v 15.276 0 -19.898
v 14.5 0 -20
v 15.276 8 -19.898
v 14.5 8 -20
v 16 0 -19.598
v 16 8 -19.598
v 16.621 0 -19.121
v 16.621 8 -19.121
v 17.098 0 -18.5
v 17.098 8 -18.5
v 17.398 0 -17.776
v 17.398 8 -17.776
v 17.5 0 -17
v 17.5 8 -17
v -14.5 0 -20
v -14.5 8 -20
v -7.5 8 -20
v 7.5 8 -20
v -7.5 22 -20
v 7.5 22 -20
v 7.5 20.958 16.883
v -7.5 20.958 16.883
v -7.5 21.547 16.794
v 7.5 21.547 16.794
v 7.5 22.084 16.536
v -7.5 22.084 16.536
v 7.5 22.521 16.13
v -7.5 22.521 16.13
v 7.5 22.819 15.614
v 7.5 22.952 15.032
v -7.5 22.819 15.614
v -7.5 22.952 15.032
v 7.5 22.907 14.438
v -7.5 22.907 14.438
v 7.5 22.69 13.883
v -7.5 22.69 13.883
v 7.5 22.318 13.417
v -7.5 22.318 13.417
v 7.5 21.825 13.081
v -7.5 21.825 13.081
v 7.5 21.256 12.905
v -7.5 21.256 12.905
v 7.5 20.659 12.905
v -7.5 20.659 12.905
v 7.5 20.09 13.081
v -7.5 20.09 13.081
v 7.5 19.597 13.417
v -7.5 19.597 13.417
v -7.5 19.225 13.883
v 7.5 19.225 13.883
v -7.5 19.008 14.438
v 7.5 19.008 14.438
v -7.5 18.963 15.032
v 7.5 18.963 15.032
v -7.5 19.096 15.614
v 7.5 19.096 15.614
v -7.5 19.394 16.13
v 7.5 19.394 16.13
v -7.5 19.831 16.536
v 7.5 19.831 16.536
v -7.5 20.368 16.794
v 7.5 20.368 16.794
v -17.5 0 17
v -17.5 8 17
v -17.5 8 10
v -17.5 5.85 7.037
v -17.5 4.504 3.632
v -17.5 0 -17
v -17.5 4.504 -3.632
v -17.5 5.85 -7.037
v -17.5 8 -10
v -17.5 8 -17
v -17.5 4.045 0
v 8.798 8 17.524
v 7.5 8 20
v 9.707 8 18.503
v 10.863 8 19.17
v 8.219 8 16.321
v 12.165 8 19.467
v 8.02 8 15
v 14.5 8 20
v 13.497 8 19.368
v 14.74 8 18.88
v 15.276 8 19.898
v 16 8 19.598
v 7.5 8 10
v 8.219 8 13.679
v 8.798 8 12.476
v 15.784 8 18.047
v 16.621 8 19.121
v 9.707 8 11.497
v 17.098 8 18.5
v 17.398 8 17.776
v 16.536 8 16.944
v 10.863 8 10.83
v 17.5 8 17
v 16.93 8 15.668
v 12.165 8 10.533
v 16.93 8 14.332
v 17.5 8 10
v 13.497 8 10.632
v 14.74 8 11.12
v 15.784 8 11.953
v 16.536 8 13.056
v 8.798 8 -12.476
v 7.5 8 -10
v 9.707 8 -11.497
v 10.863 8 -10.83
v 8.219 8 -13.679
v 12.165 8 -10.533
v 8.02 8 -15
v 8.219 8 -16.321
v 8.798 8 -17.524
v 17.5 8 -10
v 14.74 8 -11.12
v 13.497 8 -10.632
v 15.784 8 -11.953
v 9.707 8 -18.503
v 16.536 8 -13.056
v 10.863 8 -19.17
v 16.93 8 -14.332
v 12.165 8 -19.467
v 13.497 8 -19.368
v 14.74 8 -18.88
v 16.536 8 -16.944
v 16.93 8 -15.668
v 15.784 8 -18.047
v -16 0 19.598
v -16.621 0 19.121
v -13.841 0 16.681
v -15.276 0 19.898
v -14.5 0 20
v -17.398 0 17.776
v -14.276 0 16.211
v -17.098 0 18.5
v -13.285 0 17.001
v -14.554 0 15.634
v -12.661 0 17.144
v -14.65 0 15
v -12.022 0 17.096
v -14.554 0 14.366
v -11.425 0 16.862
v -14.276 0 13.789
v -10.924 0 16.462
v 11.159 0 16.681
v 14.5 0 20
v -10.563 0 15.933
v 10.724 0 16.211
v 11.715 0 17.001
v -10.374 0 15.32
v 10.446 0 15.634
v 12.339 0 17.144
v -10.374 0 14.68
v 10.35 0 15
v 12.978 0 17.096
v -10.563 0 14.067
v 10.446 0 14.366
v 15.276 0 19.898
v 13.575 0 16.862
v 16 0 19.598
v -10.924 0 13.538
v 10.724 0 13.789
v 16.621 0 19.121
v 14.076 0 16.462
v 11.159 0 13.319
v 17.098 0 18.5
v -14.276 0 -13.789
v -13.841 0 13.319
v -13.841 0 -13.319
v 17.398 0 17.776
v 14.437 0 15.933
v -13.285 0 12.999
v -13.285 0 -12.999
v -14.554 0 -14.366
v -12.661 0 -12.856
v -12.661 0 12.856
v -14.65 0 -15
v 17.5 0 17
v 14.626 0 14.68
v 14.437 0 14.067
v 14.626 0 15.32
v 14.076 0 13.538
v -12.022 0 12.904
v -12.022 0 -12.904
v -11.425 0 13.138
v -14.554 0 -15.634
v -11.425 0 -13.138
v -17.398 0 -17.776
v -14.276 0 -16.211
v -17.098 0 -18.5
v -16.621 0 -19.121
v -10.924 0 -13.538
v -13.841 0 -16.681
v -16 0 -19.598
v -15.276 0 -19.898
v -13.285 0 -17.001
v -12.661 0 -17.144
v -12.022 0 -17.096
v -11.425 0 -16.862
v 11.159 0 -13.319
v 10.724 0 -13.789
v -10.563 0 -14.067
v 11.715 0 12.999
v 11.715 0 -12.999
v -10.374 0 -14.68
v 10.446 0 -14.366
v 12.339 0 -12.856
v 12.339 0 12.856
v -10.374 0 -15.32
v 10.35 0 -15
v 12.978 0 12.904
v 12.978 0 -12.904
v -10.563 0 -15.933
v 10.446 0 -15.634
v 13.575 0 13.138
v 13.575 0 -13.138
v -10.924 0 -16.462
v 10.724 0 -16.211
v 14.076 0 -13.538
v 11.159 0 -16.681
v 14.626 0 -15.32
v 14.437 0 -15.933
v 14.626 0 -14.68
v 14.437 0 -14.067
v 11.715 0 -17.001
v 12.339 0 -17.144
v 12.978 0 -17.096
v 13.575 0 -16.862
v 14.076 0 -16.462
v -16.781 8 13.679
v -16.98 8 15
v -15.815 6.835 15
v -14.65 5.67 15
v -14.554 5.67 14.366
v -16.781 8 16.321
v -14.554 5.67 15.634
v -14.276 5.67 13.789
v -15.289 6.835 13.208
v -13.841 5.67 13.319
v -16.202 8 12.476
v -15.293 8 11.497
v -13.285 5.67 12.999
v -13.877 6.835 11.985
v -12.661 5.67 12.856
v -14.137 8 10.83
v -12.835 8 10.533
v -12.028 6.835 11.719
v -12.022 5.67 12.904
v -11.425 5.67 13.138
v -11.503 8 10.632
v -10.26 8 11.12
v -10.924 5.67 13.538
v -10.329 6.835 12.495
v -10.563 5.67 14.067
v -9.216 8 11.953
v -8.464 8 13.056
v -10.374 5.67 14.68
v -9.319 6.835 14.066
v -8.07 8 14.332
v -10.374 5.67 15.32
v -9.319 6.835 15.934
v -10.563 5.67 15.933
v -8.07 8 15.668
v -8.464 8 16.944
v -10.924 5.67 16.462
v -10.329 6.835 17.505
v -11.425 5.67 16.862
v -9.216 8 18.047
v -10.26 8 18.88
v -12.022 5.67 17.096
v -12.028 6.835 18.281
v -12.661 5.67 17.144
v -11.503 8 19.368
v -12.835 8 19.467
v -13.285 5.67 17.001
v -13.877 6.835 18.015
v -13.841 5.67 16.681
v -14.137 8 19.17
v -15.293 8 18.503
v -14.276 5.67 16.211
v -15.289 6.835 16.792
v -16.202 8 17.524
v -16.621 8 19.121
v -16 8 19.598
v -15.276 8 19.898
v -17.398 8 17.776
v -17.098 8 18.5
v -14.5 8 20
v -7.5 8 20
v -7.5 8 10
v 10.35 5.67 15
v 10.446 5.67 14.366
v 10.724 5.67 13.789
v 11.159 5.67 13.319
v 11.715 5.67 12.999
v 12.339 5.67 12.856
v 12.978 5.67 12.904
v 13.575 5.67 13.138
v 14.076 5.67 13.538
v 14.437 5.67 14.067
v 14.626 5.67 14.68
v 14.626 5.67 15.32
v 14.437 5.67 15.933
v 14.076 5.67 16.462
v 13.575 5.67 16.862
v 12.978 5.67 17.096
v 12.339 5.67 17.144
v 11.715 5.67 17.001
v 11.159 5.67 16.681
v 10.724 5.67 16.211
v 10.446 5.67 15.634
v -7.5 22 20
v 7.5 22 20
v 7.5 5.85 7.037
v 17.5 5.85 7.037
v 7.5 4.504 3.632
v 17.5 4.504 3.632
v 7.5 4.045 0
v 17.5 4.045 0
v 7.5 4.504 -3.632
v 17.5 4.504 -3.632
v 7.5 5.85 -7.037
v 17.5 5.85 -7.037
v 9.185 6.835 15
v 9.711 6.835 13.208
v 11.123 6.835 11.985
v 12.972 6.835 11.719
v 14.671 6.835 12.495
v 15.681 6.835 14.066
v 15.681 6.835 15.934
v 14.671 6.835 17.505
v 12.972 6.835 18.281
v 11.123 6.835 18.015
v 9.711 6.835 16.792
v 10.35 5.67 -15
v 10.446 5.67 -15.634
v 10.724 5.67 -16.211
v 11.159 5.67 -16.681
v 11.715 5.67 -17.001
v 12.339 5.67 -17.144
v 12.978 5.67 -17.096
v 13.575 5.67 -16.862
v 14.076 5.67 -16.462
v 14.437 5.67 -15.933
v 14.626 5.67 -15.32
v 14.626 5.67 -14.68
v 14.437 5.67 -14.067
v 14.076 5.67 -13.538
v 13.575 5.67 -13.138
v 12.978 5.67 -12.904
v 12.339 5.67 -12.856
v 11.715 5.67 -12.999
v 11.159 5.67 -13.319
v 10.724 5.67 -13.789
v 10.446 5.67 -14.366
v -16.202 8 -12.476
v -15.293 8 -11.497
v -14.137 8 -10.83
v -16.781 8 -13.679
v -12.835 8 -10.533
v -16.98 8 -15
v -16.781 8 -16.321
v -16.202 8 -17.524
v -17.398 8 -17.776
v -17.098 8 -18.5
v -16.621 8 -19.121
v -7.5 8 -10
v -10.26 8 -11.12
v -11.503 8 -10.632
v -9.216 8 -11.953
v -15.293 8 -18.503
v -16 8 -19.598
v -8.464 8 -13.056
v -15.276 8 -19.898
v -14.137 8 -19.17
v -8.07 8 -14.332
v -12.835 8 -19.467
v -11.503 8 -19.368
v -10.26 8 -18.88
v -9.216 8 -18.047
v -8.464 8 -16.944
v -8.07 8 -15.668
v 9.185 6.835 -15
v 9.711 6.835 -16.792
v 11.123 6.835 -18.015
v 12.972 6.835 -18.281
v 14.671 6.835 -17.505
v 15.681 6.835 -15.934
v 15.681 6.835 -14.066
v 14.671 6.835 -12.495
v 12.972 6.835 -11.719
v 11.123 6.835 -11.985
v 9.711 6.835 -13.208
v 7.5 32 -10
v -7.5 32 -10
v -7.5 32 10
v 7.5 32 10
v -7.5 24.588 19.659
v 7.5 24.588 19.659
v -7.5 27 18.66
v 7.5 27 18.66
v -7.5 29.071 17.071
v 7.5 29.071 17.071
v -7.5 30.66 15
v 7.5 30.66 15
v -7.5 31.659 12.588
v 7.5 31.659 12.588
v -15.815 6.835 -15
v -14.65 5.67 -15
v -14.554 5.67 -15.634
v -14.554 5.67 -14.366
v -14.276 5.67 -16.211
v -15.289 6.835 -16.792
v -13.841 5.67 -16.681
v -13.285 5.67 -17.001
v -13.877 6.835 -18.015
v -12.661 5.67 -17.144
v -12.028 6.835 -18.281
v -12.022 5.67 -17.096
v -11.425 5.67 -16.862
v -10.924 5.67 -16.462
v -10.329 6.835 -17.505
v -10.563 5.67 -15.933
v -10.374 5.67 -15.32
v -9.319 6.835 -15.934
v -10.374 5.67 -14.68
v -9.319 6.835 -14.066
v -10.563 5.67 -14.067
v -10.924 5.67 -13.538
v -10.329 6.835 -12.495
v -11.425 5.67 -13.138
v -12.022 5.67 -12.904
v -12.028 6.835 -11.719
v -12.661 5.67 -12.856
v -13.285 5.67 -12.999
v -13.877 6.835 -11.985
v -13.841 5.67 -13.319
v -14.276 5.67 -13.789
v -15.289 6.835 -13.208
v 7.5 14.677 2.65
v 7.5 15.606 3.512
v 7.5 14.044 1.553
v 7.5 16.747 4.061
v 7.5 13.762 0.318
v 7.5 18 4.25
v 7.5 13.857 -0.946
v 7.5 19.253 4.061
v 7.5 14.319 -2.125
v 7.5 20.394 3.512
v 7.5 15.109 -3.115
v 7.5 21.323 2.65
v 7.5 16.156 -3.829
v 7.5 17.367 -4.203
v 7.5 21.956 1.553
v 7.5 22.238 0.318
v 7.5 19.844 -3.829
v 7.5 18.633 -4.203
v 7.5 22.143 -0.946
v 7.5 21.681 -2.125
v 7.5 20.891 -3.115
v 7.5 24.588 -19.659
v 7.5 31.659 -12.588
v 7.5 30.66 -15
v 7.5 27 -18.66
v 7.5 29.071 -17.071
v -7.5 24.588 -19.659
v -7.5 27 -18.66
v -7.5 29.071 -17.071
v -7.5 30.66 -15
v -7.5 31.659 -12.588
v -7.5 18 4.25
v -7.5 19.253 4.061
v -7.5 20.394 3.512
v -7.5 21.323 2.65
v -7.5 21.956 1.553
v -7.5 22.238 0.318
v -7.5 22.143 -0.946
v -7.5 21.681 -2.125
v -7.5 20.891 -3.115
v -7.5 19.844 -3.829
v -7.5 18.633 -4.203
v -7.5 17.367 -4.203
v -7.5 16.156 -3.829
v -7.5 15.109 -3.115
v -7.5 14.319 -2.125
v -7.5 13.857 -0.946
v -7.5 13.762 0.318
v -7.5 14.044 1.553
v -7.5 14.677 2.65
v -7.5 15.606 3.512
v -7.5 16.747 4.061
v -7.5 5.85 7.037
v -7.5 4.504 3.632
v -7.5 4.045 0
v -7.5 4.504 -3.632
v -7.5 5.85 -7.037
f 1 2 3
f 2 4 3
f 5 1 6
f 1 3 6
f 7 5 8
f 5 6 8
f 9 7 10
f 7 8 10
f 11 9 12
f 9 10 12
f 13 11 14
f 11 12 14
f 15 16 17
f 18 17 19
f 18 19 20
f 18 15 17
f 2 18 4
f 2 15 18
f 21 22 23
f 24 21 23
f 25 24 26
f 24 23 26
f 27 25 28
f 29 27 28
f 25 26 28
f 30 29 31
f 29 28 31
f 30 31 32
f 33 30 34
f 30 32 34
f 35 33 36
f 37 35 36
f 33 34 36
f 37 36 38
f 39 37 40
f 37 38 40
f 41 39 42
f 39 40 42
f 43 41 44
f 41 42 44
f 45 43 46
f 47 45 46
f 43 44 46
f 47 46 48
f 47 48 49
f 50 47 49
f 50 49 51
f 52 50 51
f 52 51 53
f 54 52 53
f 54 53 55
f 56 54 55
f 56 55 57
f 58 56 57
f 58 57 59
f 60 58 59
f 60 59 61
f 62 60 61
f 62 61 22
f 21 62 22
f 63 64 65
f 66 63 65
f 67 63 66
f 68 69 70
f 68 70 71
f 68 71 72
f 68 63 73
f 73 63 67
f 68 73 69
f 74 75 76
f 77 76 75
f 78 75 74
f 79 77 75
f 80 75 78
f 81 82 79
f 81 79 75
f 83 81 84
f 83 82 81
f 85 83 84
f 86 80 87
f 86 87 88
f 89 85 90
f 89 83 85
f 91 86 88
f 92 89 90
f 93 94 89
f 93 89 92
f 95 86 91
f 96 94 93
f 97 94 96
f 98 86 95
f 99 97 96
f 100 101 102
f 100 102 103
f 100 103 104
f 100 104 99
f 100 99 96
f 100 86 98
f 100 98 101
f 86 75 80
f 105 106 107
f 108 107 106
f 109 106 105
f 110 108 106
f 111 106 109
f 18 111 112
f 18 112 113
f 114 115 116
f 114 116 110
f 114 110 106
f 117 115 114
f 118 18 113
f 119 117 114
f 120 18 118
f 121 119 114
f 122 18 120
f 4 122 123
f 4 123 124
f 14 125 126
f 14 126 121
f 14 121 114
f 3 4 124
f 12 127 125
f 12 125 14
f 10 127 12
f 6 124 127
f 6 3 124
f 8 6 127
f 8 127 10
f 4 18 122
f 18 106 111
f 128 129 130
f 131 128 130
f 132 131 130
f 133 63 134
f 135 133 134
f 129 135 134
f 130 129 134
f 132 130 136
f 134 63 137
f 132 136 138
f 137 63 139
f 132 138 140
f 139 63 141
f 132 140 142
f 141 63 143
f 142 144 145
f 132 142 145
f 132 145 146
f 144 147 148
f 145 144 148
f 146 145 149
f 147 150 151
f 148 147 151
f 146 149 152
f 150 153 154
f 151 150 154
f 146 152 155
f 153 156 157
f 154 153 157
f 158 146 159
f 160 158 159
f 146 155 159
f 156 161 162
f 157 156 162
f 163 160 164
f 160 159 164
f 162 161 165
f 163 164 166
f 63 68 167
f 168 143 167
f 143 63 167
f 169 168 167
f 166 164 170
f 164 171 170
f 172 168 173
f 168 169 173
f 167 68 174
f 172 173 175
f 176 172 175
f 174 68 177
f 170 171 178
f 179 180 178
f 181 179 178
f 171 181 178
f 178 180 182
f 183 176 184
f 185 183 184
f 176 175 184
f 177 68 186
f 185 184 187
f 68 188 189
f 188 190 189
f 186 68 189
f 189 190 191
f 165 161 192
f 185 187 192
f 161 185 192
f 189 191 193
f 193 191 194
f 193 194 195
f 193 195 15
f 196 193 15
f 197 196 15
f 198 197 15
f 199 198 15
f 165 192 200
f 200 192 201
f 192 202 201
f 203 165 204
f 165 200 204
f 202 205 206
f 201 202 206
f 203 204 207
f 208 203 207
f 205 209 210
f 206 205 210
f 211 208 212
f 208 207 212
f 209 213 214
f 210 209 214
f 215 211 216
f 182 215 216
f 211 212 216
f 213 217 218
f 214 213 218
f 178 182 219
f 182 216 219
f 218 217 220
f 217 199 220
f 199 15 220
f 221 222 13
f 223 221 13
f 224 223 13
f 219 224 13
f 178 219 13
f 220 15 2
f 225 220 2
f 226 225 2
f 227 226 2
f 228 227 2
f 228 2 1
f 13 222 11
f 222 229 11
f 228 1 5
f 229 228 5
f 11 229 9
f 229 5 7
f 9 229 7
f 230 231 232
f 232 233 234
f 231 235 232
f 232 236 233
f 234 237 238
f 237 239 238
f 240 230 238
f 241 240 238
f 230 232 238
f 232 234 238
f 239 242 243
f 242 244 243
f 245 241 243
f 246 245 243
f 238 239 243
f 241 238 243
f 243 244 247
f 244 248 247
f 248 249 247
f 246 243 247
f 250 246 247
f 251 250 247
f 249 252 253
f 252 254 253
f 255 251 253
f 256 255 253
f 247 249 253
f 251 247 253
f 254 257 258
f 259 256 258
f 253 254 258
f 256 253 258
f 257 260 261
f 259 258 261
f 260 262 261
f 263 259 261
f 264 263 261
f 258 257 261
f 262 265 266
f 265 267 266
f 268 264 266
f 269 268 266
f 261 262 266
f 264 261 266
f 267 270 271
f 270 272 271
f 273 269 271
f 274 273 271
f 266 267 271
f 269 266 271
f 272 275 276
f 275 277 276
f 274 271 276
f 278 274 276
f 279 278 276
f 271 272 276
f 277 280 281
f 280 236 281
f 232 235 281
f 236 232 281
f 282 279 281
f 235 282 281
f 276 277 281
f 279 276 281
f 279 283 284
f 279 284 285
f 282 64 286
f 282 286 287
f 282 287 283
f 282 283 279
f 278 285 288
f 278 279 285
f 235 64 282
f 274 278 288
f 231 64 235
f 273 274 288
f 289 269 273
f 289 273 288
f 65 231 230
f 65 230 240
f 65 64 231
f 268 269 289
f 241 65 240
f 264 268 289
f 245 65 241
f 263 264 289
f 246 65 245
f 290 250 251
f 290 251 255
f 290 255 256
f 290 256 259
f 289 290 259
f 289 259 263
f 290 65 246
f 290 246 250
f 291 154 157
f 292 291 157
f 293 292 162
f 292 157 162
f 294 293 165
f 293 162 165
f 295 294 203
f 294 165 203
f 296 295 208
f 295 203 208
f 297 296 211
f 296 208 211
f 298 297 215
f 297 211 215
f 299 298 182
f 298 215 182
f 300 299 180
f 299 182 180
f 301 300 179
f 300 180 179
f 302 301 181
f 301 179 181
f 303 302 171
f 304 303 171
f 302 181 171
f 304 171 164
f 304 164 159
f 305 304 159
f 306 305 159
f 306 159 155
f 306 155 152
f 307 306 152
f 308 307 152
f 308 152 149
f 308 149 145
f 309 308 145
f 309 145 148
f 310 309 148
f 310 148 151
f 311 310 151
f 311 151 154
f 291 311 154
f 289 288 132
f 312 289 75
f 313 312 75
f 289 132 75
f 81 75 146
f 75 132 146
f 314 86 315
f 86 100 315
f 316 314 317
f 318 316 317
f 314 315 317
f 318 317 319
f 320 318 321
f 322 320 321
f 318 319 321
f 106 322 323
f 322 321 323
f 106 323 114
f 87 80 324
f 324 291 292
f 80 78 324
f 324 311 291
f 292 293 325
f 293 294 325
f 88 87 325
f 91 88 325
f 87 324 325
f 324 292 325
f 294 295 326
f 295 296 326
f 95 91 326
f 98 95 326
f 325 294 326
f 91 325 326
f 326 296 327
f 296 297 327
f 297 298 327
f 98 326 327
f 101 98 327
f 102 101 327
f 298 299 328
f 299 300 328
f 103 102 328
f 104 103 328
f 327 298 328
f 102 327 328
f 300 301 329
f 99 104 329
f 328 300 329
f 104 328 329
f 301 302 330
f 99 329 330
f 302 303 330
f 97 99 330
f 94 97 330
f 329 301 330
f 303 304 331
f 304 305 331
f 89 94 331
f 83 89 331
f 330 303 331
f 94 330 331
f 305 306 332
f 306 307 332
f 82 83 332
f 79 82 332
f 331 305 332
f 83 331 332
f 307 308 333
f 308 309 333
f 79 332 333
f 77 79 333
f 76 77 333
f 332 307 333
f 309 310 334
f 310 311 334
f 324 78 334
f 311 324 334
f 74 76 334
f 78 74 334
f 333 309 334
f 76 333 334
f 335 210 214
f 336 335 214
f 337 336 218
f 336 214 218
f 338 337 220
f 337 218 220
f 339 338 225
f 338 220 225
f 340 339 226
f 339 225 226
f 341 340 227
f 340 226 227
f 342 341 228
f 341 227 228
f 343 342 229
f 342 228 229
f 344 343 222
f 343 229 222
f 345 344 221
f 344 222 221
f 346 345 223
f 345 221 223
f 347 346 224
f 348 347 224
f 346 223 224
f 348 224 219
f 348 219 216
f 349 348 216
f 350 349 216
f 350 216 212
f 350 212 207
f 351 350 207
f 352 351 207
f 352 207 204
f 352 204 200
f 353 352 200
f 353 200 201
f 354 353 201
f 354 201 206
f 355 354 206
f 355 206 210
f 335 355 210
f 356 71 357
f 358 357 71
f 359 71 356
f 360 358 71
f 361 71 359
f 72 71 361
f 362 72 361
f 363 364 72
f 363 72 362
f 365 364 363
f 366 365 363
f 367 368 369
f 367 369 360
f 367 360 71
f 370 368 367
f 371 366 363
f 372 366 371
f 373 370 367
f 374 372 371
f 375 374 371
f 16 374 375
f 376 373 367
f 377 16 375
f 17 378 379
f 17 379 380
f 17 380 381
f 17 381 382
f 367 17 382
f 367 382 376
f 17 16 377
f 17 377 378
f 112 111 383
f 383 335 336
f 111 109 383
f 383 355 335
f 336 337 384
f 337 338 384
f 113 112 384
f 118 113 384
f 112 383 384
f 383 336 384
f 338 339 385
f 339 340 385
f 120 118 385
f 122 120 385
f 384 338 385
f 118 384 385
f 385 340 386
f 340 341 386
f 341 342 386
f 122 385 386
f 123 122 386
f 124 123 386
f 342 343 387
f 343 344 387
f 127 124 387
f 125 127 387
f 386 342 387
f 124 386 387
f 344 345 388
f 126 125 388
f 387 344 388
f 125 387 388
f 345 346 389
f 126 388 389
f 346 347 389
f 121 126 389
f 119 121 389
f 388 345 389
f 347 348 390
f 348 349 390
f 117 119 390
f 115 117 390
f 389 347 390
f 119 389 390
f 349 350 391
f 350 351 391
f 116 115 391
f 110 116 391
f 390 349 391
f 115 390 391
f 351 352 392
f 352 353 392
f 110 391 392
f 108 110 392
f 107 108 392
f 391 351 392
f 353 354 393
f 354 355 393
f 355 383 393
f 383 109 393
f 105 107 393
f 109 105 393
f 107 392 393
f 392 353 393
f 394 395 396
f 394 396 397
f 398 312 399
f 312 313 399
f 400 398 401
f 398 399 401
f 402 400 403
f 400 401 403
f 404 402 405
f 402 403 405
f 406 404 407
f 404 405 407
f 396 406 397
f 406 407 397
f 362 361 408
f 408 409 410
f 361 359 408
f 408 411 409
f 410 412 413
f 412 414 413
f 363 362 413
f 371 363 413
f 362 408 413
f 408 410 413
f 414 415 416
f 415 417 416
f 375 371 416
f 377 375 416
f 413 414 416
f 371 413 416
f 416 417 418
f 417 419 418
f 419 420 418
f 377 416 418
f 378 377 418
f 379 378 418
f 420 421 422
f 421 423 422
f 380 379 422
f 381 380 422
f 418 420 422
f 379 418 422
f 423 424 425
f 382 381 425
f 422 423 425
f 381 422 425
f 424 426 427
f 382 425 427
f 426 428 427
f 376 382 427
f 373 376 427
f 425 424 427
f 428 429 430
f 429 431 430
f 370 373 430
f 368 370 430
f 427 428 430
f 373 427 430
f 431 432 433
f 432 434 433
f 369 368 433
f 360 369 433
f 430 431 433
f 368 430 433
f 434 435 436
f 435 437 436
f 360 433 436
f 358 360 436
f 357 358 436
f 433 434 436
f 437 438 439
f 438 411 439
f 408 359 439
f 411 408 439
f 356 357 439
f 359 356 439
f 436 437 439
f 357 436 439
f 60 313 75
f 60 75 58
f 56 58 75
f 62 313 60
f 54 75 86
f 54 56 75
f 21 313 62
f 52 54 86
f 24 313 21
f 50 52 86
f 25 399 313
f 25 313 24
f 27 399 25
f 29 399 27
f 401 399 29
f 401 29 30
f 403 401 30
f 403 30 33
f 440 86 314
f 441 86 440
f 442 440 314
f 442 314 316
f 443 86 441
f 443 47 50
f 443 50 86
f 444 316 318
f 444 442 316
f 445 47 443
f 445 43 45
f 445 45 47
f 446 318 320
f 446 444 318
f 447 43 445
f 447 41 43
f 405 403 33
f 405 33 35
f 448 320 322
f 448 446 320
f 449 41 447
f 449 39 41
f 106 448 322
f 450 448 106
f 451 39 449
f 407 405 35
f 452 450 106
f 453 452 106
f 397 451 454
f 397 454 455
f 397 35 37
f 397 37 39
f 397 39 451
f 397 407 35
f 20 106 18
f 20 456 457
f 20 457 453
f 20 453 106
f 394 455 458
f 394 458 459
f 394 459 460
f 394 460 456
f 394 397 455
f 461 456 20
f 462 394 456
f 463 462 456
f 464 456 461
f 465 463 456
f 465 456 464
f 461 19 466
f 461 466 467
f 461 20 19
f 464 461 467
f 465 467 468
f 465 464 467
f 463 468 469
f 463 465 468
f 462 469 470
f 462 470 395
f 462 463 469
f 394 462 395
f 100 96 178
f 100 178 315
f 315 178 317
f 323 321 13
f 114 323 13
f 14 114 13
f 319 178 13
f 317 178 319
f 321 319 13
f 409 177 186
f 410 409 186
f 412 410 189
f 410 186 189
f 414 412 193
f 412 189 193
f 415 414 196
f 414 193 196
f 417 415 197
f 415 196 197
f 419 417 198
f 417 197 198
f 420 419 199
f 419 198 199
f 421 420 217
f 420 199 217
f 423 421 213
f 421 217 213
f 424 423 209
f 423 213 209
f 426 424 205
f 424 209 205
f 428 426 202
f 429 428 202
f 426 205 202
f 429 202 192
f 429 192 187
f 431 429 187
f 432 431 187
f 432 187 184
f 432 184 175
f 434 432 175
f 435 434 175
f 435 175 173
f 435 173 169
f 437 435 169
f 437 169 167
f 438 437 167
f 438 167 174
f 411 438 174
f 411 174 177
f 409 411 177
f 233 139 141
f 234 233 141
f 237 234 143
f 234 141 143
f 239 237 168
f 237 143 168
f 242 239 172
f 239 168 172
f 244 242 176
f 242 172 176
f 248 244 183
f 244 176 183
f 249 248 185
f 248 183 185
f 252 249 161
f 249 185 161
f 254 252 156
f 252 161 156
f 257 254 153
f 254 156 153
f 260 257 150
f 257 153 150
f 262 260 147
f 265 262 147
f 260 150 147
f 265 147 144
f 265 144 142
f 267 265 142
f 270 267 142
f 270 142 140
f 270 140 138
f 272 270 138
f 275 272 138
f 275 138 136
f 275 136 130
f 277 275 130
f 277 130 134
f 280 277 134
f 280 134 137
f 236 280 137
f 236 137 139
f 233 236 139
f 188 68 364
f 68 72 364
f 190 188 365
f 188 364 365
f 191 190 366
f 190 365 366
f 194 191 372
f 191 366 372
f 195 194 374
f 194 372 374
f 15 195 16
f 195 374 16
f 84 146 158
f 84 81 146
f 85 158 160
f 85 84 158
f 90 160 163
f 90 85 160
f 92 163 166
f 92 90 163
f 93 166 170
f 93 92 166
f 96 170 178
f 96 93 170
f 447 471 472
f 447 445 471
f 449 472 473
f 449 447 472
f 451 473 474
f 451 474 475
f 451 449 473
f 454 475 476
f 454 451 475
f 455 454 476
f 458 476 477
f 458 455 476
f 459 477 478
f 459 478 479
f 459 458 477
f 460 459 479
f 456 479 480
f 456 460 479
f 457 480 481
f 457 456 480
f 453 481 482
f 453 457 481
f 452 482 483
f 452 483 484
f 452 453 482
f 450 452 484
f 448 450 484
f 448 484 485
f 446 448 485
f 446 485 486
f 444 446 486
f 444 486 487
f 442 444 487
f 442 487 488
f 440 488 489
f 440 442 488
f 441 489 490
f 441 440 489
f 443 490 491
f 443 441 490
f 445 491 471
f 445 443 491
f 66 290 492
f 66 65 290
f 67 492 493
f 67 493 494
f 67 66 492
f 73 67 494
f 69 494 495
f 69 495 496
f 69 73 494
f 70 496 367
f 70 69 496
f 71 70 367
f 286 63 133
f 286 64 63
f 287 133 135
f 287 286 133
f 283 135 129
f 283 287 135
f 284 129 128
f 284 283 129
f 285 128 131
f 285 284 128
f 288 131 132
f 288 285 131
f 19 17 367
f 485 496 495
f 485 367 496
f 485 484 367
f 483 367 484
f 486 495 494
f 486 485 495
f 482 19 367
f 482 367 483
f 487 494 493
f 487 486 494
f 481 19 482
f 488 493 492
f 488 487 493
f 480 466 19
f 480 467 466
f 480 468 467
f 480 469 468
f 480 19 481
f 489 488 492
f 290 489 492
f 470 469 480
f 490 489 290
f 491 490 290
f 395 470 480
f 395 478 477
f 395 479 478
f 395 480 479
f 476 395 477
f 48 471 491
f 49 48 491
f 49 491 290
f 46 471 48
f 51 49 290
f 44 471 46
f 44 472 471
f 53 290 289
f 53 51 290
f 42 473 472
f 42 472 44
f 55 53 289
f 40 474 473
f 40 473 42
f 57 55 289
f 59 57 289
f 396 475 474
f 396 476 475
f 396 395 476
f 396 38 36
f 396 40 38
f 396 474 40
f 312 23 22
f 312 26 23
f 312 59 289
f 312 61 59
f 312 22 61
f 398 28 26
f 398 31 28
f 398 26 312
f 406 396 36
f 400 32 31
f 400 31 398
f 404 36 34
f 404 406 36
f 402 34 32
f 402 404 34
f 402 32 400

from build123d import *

# Parameters (mm, degrees)
SKETCH_2_W                   = 35
SKETCH_2_H                   = 40
EXTRUDE_1_DEPTH              = 8
SKETCH_3_R                   = 2
CUT_EXTRUDE_2_DEPTH          = 10
SKETCH_4_W                   = 15
SKETCH_4_H                   = 40
EXTRUDE_2_DEPTH              = 24
SKETCH_5_R                   = 6.2
CUT_EXTRUDE_3_DEPTH          = 46.265881191
SKETCH_6_R                   = 10
CUT_EXTRUDE_4_DEPTH          = 3
FILLET_2_R                   = 3
FILLET_3_R                   = 10
HOLE_WIZARD_M4_1_D           = 4.3
HOLE_WIZARD_M4_1_DEPTH       = 8
HOLE_WIZARD_M4_1_CSINK_D     = 8.96
HOLE_WIZARD_M4_1_CSINK_ANGLE = 90
SKETCH_9_R                   = 10
EXTRUDE_3_DEPTH              = 3
SKETCH_10_R                  = 4.25
CUT_EXTRUDE_5_DEPTH          = 3
CUT_EXTRUDE_6_DEPTH          = 5
SKETCH_14_R                  = 6.2
SKETCH_14_R_2                = 4.25
EXTRUDE_4_DEPTH              = 12
SKETCH_15_R                  = 2
CUT_EXTRUDE_8_DEPTH          = 22


with BuildPart() as part:
    # 草图2 → 凸台-拉伸1 (new body)
    with BuildSketch(Plane(origin=(0, 0, 0), x_dir=(1, 0, 0), z_dir=(0, 1, 0))):
        Rectangle(SKETCH_2_W, SKETCH_2_H)
    extrude(amount=EXTRUDE_1_DEPTH)

    # 草图3 → 切除-拉伸2 (cut)
    with BuildSketch(Plane(origin=(0, 8, 0), x_dir=(1, 0, 0), z_dir=(0, 1, 0))):
        with Locations(Location((12.5, 15, 0), (0, 0, 270))):
            Circle(SKETCH_3_R)
        with Locations(Location((-12.5, 15, 0), (0, 0, 270))):
            Circle(SKETCH_3_R)
        with Locations(Location((-12.5, -15, 0), (0, 0, 270))):
            Circle(SKETCH_3_R)
        with Locations(Location((12.5, -15, 0), (0, 0, 270))):
            Circle(SKETCH_3_R)
    extrude(amount=-CUT_EXTRUDE_2_DEPTH, mode=Mode.SUBTRACT)

    # 草图4 → 凸台-拉伸2 (add)
    with BuildSketch(Plane(origin=(0, 8, 0), x_dir=(1, 0, 0), z_dir=(0, 1, 0))):
        Rectangle(SKETCH_4_W, SKETCH_4_H)
    extrude(amount=EXTRUDE_2_DEPTH)

    # 草图5 → 切除-拉伸3 (cut, through all)
    with BuildSketch(Plane(origin=(7.5, 0, 0), x_dir=(0, 0, -1), z_dir=(1, 0, 0))):
        with Locations((0, 18)):
            Circle(SKETCH_5_R)
    extrude(amount=-CUT_EXTRUDE_3_DEPTH, mode=Mode.SUBTRACT)

    # 草图6 → 切除-拉伸4 (cut)
    with BuildSketch(Plane(origin=(7.5, 0, 0), x_dir=(0, 0, -1), z_dir=(1, 0, 0))):
        with Locations((0, 18)):
            Circle(SKETCH_6_R)
    extrude(amount=-CUT_EXTRUDE_4_DEPTH, mode=Mode.SUBTRACT)

    # 圆角2
    fillet_2_edges = [part.edges().sort_by_distance(p)[0] for p in [
        (17.5, 4, -20),
        (-17.5, 4, -20),
        (-17.5, 4, 20),
        (17.5, 4, 20),
    ]]
    fillet(fillet_2_edges, radius=FILLET_2_R)

    # 圆角3
    fillet_3_edges = [part.edges().sort_by_distance(p)[0] for p in [
        (0, 32, 20),
        (0, 32, -20),
    ]]
    fillet(fillet_3_edges, radius=FILLET_3_R)

    # M4 六角凹锥坑螺钉的锥形沉头孔1
    with Locations(Plane(origin=(0, 8, 0), x_dir=(1, 0, 0), z_dir=(0, 1, 0))):
        with Locations((12.5, -15), (12.5, 15), (-12.5, 15), (-12.5, -15)):
            CounterSinkHole(HOLE_WIZARD_M4_1_D / 2, HOLE_WIZARD_M4_1_CSINK_D / 2, depth=HOLE_WIZARD_M4_1_DEPTH, counter_sink_angle=HOLE_WIZARD_M4_1_CSINK_ANGLE)

    # 草图9 → 凸台-拉伸3 (add)
    with BuildSketch(Plane(origin=(7.5, 0, 0), x_dir=(0, 0, -1), z_dir=(1, 0, 0))):
        with Locations((0, 18)):
            Circle(SKETCH_9_R)
    extrude(amount=-EXTRUDE_3_DEPTH)

    # 草图10 → 切除-拉伸5 (cut)
    with BuildSketch(Plane.ZY.offset(-4.5)):
        with Locations((0, 18)):
            Circle(SKETCH_10_R)
    extrude(amount=-CUT_EXTRUDE_5_DEPTH, mode=Mode.SUBTRACT)

    # 草图12 → 切除-拉伸6 (cut, symmetric)
    with BuildSketch(Plane.ZY.offset(12.5)):
        with BuildLine():
            Line((-10, 8), (10, 8))
            ThreePointArc((10, 8), (0, 4.045383588), (-10, 8))
        make_face()
    cut_extrude_6 = extrude(amount=CUT_EXTRUDE_6_DEPTH, both=True, mode=Mode.SUBTRACT)

    # 镜向1: 切除-拉伸6 across plane
    add(cut_extrude_6.mirror(Plane.ZY), mode=Mode.SUBTRACT)

    # 草图14 → 凸台-拉伸4 (add)
    with BuildSketch(Plane.ZY.offset(-4.5)):
        with Locations((0, 18)):
            Circle(SKETCH_14_R)
        with Locations((0, 18)):
            Circle(SKETCH_14_R_2, mode=Mode.SUBTRACT)
    extrude(amount=EXTRUDE_4_DEPTH)

    # 草图15 → 切除-拉伸8 (cut)
    with BuildSketch(Plane.ZY.offset(7.5)):
        with Locations((14.883032336, 20.9575309)):
            Circle(SKETCH_15_R)
    extrude(amount=-CUT_EXTRUDE_8_DEPTH, mode=Mode.SUBTRACT)


solid = part.part
